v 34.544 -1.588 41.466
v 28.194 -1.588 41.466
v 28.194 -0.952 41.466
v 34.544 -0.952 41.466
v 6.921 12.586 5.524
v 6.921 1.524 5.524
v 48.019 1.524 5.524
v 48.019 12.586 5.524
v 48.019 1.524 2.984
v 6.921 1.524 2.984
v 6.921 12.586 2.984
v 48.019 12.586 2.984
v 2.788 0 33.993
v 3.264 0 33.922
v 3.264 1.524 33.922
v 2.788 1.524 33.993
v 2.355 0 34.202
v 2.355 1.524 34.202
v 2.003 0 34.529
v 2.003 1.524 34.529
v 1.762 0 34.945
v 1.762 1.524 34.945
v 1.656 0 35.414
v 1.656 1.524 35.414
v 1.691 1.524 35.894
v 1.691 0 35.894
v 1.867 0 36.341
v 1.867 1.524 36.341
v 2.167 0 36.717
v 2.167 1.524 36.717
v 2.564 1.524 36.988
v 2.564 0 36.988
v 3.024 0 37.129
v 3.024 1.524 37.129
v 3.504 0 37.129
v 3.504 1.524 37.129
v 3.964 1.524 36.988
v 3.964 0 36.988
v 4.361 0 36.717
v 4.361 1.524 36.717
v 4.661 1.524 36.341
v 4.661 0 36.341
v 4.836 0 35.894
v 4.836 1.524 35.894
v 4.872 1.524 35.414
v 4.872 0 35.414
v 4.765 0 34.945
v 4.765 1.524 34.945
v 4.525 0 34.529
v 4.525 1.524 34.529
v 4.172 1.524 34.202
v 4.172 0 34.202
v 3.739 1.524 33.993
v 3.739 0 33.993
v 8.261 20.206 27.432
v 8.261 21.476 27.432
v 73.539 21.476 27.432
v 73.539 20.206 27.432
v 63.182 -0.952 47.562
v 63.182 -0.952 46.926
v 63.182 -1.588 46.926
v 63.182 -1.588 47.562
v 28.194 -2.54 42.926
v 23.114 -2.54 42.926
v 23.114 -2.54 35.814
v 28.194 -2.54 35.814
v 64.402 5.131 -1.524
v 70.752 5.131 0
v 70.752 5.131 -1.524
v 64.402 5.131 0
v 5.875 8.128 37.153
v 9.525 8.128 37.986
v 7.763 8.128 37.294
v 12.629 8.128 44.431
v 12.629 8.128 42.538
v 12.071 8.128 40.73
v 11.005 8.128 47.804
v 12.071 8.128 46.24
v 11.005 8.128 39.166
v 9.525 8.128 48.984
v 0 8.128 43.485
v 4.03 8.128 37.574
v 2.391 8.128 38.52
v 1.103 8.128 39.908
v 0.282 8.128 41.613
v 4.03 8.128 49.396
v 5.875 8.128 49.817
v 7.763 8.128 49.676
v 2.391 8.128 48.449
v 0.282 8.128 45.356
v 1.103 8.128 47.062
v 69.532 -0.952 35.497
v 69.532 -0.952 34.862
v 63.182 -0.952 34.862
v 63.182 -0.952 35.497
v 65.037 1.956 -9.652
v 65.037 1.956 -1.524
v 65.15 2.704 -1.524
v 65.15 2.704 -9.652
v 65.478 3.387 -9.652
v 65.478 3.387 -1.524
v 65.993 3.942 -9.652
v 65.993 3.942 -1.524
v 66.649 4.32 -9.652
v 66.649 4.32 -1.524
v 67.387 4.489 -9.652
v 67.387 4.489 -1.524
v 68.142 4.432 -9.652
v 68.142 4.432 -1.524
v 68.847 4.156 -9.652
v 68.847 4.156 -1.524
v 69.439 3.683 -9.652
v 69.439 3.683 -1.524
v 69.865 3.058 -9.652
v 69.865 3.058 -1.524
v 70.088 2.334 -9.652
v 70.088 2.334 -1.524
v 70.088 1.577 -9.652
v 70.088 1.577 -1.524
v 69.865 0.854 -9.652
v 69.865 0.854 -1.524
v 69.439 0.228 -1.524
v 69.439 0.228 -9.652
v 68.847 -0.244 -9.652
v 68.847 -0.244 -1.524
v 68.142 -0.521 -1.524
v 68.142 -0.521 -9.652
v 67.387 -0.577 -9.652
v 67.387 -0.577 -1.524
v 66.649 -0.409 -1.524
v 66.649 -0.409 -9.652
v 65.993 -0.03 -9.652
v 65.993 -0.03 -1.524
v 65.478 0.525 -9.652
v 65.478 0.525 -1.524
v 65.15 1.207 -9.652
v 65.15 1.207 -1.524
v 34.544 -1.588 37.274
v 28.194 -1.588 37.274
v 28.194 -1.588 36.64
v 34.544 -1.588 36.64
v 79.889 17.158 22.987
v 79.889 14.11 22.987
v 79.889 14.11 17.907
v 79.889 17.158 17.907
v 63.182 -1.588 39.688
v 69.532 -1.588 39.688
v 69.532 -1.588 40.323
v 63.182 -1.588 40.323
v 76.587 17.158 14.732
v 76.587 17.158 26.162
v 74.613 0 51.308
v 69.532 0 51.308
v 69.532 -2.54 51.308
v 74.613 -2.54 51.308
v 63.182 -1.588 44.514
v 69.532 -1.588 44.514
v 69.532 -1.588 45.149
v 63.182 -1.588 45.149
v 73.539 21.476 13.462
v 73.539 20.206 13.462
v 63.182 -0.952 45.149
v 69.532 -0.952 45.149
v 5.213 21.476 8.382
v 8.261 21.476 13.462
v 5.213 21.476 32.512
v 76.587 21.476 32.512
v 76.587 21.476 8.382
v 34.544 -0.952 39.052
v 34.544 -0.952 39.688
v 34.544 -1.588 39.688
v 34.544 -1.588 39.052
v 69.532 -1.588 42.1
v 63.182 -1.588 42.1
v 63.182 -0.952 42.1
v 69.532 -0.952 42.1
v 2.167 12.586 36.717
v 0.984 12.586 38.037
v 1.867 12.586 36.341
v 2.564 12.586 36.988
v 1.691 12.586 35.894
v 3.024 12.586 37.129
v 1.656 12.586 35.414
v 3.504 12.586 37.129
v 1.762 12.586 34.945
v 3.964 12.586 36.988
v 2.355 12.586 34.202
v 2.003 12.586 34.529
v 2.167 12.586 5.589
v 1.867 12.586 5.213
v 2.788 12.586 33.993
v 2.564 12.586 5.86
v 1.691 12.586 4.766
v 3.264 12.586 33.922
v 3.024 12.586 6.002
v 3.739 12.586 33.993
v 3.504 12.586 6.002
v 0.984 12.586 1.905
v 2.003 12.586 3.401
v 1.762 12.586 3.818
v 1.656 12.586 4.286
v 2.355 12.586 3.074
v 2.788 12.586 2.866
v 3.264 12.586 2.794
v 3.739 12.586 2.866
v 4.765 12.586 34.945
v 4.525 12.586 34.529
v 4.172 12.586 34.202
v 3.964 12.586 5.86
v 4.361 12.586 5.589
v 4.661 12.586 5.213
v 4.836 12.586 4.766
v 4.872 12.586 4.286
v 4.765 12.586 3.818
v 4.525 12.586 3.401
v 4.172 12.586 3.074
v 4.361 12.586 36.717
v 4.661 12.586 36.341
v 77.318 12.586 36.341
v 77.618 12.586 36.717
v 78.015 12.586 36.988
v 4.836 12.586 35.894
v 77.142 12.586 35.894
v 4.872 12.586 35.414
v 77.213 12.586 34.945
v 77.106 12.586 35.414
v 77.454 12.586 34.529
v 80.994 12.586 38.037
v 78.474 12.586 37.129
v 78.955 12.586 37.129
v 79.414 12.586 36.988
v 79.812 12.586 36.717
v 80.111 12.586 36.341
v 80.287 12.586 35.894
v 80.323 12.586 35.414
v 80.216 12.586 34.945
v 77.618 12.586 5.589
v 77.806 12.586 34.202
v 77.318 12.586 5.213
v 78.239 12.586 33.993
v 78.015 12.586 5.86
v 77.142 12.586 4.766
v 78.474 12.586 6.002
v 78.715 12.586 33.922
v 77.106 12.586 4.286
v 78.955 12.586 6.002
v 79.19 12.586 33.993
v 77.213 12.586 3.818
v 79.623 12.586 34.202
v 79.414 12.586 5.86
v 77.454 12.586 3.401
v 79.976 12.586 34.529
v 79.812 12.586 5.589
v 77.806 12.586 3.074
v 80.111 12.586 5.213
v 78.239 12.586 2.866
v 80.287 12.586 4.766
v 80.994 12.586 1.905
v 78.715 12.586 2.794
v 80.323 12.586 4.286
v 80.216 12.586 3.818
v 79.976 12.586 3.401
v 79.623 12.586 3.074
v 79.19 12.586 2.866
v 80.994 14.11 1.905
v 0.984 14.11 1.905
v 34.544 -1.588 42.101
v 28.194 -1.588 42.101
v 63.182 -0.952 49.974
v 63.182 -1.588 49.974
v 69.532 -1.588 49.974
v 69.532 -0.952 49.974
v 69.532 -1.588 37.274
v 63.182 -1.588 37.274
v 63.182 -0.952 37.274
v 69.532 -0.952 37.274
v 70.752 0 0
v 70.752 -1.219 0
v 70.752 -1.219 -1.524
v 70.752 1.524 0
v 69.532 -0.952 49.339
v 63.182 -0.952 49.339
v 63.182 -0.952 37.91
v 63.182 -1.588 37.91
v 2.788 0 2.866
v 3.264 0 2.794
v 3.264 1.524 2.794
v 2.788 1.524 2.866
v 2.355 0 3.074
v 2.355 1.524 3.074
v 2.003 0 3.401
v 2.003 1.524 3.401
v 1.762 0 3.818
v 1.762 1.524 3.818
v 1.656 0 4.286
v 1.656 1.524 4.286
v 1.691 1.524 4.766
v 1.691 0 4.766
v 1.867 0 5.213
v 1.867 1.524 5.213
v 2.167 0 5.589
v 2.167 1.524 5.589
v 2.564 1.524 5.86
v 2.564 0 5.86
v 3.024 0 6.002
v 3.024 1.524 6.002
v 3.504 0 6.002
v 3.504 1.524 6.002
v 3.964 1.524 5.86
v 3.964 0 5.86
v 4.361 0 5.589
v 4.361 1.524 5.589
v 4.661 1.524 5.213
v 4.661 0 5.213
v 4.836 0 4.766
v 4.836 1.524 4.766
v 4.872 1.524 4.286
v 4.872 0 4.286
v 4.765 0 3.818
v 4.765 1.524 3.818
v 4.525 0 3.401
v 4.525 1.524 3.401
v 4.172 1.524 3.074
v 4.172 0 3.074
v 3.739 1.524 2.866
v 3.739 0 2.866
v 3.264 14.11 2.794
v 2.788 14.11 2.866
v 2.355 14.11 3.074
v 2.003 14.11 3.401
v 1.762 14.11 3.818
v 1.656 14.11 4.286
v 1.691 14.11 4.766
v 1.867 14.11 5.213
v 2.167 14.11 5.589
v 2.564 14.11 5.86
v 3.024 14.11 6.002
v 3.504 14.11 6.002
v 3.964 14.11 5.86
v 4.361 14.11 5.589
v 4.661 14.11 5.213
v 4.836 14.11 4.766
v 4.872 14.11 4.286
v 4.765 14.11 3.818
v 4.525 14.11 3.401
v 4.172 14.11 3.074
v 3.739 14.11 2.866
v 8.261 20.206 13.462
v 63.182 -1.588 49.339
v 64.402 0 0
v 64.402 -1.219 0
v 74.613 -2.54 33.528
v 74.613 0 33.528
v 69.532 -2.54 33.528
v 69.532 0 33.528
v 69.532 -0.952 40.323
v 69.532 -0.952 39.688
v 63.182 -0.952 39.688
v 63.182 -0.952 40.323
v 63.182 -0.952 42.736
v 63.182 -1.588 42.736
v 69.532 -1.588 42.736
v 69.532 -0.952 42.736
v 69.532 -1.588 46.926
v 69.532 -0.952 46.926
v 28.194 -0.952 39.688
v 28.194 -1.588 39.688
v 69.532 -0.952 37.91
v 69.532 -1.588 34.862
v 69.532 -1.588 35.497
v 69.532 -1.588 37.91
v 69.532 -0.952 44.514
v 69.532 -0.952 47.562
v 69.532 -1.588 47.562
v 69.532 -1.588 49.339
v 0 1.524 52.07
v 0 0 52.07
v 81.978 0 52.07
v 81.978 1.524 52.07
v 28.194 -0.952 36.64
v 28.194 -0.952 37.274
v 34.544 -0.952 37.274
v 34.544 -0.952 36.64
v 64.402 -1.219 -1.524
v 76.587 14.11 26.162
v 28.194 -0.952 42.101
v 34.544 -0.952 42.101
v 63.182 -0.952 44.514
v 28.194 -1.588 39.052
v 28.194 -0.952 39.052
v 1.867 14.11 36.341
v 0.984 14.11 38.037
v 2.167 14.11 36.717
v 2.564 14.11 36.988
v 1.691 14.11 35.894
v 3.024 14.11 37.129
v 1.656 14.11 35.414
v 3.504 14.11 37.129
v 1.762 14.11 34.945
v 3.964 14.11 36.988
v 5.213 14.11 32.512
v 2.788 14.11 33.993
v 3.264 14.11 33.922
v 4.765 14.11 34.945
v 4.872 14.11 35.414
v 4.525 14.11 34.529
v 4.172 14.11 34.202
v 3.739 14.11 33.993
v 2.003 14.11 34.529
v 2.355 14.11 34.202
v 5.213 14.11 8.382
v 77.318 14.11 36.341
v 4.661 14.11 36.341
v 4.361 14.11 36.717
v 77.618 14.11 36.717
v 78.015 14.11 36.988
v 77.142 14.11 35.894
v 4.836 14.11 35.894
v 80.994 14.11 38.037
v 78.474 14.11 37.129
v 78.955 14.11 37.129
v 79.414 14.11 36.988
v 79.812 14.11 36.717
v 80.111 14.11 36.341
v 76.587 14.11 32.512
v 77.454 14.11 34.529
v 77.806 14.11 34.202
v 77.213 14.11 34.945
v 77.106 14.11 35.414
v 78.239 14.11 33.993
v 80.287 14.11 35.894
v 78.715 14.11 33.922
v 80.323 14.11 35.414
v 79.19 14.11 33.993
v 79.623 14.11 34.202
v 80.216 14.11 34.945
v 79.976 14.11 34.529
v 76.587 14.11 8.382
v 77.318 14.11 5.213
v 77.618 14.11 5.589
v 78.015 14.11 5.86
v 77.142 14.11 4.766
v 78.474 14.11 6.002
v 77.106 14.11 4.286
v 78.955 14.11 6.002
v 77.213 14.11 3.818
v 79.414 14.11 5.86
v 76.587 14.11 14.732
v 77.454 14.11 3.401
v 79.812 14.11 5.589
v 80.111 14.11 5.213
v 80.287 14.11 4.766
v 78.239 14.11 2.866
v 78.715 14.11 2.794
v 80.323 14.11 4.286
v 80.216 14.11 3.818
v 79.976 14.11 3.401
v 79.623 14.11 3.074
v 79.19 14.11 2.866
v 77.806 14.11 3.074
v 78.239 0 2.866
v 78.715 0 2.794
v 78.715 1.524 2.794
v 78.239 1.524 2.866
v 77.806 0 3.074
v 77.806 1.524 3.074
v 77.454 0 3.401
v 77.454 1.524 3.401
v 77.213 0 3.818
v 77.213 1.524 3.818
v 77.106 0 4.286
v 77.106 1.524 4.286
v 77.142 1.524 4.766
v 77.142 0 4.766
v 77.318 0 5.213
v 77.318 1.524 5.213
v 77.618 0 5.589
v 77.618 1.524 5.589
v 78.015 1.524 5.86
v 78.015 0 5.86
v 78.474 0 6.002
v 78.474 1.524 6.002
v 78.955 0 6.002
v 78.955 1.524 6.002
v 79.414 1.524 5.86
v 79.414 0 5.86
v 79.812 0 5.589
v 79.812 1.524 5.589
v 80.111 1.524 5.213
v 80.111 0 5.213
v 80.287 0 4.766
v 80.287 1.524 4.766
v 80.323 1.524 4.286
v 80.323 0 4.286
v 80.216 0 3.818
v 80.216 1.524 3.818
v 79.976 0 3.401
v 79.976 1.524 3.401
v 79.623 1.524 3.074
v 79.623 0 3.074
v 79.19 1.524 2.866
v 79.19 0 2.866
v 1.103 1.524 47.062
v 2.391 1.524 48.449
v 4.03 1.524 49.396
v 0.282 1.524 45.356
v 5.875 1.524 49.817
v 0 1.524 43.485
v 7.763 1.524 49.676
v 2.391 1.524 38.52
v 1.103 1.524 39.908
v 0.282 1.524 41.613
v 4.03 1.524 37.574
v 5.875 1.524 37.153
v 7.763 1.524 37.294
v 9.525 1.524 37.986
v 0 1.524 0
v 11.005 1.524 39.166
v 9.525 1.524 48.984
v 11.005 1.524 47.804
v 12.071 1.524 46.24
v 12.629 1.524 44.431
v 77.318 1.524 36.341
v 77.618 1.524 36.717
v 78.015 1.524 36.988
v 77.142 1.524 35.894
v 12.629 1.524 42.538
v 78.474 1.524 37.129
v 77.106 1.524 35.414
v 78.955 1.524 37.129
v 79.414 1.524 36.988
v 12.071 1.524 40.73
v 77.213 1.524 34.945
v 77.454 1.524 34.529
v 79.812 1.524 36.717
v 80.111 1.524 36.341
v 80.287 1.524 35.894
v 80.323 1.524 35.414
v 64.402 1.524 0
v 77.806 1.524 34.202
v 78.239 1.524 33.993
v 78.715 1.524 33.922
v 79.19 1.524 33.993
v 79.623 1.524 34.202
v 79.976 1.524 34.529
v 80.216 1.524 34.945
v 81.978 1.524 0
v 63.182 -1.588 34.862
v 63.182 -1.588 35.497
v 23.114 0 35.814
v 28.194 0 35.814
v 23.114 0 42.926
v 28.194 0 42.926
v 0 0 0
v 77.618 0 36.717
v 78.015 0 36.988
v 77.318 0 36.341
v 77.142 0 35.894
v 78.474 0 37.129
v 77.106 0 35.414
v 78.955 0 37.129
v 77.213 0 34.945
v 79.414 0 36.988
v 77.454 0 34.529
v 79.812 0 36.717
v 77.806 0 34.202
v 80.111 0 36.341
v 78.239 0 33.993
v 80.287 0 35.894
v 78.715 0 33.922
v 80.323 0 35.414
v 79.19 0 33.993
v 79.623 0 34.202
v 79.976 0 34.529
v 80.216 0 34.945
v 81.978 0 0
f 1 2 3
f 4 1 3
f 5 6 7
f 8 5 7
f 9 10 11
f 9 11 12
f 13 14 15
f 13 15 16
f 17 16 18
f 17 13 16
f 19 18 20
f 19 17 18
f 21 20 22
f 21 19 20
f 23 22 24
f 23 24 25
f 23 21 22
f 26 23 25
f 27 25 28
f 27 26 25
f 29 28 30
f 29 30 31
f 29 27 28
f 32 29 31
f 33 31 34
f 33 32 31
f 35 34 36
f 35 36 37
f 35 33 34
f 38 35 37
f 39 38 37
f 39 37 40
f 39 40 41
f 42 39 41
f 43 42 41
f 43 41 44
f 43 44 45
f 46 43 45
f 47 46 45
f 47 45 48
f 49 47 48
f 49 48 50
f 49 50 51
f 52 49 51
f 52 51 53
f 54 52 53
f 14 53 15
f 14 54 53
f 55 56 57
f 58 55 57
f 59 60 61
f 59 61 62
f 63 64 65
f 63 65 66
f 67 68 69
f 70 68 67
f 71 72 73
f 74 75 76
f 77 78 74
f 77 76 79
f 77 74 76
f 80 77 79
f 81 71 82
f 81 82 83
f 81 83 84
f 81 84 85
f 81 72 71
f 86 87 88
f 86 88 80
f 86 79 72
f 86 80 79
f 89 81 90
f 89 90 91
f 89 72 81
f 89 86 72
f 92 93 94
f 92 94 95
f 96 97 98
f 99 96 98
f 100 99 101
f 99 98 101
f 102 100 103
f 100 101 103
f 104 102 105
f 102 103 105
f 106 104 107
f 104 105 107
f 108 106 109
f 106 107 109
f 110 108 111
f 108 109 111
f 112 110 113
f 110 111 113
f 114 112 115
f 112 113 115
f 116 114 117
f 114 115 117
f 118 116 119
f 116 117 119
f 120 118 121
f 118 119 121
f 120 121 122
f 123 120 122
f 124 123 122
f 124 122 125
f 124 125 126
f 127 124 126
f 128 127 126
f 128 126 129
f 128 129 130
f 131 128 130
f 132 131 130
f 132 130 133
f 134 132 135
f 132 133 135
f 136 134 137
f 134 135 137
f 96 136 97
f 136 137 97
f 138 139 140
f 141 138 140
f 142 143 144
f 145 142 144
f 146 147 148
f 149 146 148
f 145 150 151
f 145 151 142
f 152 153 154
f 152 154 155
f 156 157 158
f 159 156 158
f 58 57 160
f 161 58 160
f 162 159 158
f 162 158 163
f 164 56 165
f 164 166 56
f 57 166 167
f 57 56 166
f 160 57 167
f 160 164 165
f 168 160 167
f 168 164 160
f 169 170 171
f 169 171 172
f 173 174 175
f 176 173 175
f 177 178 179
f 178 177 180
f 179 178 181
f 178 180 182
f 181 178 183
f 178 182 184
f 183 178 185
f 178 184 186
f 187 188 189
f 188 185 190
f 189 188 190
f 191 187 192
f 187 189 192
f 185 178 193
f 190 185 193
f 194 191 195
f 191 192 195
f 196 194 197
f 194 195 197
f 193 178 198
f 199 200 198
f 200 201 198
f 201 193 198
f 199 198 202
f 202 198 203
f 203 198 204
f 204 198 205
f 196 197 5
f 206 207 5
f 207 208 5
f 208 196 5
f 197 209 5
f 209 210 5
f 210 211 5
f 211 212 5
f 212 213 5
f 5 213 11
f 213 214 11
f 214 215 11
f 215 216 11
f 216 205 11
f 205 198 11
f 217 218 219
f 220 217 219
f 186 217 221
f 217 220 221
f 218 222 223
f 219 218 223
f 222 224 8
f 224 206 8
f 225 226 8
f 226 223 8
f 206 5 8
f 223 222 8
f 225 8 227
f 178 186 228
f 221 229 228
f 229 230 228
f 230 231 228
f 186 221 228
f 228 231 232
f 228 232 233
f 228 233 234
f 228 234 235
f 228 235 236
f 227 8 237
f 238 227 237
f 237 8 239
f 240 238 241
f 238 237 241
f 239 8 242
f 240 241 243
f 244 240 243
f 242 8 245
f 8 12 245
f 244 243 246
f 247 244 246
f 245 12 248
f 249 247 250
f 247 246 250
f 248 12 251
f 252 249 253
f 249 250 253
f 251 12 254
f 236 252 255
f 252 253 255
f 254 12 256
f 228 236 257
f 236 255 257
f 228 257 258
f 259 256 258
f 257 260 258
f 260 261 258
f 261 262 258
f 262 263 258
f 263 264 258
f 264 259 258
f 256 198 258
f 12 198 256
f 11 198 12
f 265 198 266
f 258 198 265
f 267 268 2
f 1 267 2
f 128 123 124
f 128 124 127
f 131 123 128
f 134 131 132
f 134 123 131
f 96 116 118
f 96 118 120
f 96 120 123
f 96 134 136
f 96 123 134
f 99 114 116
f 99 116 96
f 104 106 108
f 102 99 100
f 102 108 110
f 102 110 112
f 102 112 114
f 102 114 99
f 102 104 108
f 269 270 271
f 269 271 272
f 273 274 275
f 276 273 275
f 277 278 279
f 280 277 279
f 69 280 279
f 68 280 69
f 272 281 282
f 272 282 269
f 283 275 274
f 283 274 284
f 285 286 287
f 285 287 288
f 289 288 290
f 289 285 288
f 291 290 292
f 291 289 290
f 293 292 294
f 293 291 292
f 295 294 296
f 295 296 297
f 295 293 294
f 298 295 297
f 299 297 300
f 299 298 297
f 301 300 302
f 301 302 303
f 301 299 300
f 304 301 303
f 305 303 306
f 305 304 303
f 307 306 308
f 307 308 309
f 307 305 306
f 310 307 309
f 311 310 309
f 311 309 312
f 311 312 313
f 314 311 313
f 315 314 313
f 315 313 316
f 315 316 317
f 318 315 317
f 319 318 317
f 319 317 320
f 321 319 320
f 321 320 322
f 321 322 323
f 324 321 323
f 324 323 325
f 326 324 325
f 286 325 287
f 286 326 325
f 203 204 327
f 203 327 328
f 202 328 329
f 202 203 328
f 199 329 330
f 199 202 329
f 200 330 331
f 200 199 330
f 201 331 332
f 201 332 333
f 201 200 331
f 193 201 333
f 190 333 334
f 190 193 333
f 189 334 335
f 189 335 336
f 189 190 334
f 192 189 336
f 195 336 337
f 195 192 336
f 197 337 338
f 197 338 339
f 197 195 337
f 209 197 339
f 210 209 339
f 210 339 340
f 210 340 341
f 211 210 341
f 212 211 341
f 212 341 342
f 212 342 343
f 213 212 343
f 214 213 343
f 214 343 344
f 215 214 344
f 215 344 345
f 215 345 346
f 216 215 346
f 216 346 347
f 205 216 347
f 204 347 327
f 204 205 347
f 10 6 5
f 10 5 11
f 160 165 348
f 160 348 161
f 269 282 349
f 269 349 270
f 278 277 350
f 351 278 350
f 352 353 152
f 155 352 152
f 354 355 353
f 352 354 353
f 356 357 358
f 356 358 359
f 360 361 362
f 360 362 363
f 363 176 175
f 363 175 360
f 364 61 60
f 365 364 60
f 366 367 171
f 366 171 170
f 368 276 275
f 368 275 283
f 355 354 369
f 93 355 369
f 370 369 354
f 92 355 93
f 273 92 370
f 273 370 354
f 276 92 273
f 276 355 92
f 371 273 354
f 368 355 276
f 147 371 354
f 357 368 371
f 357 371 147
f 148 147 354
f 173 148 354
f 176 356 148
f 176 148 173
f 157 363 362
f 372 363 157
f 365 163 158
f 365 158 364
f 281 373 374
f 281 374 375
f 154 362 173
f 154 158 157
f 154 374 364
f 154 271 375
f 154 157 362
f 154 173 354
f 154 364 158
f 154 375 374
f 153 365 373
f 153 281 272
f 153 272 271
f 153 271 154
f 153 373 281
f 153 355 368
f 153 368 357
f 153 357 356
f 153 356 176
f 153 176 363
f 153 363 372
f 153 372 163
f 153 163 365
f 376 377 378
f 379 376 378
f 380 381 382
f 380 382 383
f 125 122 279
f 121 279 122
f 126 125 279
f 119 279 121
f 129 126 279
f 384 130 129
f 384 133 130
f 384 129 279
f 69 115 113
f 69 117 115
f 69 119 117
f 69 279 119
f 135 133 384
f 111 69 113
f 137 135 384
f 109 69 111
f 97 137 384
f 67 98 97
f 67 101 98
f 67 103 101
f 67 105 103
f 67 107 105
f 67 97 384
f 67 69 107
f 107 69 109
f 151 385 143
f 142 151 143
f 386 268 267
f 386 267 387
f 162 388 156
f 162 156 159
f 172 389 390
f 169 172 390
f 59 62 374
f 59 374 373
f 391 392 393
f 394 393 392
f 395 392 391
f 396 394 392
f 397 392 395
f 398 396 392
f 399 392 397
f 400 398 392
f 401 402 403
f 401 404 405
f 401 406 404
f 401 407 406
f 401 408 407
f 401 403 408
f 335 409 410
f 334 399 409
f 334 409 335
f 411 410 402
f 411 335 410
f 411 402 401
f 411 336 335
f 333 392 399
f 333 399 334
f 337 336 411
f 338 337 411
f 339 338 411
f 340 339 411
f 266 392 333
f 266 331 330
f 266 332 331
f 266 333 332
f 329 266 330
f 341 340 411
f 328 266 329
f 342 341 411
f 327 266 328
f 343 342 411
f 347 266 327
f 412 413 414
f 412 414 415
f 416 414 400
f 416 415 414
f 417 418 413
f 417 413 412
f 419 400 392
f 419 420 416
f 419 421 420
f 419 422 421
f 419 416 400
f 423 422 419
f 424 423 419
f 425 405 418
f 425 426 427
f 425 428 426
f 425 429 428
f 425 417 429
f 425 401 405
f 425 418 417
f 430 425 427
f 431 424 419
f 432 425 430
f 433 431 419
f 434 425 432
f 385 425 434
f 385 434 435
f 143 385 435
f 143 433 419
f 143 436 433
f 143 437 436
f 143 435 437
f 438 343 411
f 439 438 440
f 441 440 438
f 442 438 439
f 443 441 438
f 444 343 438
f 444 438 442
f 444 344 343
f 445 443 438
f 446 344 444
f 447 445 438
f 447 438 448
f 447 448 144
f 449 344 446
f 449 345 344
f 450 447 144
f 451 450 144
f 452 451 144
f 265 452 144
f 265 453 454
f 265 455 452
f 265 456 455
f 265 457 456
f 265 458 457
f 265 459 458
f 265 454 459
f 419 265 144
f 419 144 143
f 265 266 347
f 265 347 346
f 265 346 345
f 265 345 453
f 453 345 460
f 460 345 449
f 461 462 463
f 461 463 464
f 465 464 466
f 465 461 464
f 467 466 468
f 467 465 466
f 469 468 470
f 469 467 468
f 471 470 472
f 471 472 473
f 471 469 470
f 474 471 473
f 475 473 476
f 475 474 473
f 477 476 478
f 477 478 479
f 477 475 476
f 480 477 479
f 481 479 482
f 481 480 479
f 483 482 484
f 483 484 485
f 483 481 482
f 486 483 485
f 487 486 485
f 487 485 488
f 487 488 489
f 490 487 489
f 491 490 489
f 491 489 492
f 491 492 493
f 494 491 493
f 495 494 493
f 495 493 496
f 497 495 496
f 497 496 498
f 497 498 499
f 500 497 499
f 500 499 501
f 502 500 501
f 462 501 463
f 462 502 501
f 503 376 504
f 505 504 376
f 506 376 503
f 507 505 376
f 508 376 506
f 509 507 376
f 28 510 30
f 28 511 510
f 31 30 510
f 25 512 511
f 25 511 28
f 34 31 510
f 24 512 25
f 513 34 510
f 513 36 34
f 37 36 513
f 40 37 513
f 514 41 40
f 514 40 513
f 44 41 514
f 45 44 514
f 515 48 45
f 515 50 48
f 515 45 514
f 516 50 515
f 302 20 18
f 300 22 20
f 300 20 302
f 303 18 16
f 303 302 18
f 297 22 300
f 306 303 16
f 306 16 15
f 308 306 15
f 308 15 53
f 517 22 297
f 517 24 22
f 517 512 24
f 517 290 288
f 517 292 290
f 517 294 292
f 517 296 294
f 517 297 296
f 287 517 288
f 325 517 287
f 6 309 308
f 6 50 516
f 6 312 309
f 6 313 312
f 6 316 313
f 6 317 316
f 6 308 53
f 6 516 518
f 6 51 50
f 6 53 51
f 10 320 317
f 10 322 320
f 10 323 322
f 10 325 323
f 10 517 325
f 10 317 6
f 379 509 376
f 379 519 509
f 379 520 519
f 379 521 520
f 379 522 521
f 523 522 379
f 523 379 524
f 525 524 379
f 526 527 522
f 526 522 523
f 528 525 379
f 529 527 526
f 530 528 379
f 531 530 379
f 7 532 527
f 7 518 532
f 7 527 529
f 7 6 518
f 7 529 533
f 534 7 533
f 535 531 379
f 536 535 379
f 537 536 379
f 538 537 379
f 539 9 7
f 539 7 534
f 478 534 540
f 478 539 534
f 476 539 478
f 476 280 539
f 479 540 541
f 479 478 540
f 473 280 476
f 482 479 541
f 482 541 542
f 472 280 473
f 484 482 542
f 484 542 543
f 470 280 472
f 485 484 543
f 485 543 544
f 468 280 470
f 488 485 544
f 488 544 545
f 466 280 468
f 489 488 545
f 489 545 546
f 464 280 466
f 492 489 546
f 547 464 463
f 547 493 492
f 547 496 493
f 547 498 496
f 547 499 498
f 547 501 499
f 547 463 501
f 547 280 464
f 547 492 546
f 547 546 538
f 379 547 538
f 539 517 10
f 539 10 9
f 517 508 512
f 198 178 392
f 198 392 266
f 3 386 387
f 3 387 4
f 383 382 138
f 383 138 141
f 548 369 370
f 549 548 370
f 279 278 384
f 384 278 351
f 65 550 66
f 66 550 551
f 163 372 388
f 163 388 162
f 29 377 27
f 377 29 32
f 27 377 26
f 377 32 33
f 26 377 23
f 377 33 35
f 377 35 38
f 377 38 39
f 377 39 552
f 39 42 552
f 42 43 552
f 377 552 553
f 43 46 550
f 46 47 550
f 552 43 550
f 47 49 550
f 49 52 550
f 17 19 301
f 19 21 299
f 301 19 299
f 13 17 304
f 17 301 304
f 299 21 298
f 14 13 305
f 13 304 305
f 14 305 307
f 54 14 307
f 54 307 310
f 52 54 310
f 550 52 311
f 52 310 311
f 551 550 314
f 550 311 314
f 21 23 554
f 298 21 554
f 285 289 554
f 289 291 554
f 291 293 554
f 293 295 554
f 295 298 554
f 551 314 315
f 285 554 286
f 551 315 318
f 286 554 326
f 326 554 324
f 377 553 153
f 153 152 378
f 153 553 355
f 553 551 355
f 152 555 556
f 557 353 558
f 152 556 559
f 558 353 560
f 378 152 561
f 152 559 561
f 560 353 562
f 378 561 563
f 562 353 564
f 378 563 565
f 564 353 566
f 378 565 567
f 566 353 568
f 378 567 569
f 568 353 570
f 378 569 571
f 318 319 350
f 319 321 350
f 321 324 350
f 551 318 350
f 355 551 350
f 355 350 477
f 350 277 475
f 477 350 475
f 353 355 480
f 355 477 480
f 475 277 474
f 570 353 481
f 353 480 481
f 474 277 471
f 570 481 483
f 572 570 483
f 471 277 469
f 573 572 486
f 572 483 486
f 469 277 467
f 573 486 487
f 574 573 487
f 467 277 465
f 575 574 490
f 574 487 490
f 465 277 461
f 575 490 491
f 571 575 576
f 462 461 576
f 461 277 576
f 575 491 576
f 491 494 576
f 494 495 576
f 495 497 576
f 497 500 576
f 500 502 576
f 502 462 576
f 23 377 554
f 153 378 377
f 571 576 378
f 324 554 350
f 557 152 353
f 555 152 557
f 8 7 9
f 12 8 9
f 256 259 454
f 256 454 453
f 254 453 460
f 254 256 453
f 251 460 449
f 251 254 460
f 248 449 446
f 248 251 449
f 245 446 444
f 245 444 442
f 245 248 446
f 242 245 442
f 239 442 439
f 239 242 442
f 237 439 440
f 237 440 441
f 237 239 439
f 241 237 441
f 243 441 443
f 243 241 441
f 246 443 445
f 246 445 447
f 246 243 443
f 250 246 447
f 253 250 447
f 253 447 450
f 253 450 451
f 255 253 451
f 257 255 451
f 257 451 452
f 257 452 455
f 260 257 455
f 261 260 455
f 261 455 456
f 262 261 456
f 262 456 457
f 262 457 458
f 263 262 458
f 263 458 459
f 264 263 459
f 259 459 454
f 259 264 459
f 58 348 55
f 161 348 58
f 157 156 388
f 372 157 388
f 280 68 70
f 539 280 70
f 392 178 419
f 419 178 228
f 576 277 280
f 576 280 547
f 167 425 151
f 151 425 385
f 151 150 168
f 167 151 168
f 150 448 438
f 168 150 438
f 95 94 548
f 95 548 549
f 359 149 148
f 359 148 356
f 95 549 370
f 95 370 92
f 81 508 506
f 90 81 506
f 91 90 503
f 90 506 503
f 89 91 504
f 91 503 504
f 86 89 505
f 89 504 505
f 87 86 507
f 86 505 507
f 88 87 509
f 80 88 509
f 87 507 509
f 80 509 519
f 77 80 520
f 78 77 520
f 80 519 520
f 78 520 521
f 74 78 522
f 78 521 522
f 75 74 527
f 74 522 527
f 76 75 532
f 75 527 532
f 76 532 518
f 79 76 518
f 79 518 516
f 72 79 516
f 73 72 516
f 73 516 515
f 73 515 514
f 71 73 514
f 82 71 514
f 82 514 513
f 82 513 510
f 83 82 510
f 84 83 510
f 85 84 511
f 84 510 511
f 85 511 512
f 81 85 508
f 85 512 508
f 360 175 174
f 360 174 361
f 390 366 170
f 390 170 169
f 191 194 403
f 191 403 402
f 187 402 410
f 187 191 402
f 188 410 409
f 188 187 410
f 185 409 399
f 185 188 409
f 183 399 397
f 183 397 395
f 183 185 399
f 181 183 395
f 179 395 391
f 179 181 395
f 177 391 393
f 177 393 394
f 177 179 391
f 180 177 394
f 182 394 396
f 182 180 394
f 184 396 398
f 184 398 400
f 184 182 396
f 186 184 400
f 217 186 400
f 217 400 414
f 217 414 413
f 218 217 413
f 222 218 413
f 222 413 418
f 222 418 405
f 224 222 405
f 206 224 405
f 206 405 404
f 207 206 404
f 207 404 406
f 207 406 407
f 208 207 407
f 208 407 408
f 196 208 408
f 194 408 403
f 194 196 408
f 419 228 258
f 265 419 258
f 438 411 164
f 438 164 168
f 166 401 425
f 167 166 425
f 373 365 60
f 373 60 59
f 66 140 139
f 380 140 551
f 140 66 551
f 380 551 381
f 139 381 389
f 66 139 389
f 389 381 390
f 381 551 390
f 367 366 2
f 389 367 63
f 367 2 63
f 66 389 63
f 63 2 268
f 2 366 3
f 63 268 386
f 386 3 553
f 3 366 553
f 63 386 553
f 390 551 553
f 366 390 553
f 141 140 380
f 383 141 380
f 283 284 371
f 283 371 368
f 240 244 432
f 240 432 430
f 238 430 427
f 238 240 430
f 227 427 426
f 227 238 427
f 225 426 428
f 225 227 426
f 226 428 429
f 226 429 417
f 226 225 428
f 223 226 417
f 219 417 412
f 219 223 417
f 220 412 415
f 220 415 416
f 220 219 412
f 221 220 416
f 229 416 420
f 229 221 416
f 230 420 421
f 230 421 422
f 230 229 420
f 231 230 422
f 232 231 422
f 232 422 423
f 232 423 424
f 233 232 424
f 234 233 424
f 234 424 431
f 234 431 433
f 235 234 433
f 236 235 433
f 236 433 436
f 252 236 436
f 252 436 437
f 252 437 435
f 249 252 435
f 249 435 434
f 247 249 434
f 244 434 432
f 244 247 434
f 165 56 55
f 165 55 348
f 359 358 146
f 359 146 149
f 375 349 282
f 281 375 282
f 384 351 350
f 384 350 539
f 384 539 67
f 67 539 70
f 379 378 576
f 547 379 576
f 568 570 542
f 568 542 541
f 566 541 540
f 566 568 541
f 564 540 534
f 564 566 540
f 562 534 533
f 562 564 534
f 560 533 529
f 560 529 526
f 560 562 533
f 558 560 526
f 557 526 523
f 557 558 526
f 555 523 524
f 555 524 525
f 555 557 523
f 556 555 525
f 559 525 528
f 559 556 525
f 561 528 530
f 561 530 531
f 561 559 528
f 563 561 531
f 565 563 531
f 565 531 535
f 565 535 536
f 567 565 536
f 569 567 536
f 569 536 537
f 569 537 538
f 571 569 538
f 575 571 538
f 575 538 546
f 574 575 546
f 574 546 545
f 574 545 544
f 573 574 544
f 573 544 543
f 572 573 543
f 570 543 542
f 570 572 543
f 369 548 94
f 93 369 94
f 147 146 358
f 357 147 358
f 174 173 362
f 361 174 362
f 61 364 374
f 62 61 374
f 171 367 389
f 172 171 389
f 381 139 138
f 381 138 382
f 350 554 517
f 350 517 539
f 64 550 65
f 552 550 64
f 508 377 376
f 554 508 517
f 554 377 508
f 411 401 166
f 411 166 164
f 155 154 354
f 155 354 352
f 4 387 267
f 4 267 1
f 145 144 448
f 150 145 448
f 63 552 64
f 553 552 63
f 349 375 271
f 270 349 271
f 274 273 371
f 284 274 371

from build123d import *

# Parameters (mm, degrees)
SKETCH1_W            = 81.9785
SKETCH1_H            = 52.07
SKETCH1_R            = 1.6129
BASE_PCB_DEPTH       = 1.524
SKETCH2_W            = 6.35
SKETCH2_H            = 6.35
BOSS_EXTRUDE2_DEPTH  = 1.524
SKETCH3_R            = 2.54
BOSS_EXTRUDE3_DEPTH  = 8.128
SKETCH4_W            = 41.0972
SKETCH4_H            = 2.54
LCD_HEADER_DEPTH     = 11.0617
SKETCH5_W            = 80.01
SKETCH5_H            = 36.1315
SKETCH5_R            = 1.6129
LCD_PCB_DEPTH        = 1.524
SKETCH6_W            = 71.374
SKETCH6_H            = 24.13
BOSS_EXTRUDE6_DEPTH  = 7.366
SKETCH7_W            = 65.278
SKETCH7_H            = 13.97
CUT_EXTRUDE1_DEPTH   = 1.27
BOSS_EXTRUDE7_DEPTH  = 3.048
SKETCH9_R            = 6.35
BUZZER_DEPTH         = 6.604
SKETCH10_W           = 5.08
SKETCH10_H           = 17.78
BOSS_EXTRUDE9_DEPTH  = 2.54
SKETCH11_W           = 0.635
SKETCH11_H           = 0.635
BOSS_EXTRUDE10_DEPTH = 6.35
SKETCH12_W           = 5.08
SKETCH12_H           = 7.112
BOSS_EXTRUDE11_DEPTH = 2.54
SKETCH13_W           = 0.635
SKETCH13_H           = 0.635
BOSS_EXTRUDE12_DEPTH = 6.35


with BuildPart() as part:
    # Sketch1 → Base PCB (new body)
    with BuildSketch(Plane(origin=(0, 0, 0), x_dir=(1, 0, 0), z_dir=(0, 1, 0))):
        with Locations((40.98925, -26.035)):
            Rectangle(SKETCH1_W, SKETCH1_H)
        with Locations(Location((3.2639, -4.4069, 0), (0, 0, 90))):
            Circle(SKETCH1_R, mode=Mode.SUBTRACT)
        with Locations(Location((3.2639, -35.5346, 0), (0, 0, 90))):
            Circle(SKETCH1_R, mode=Mode.SUBTRACT)
        with Locations(Location((78.7146, -35.5346, 0), (0, 0, 90))):
            Circle(SKETCH1_R, mode=Mode.SUBTRACT)
        with Locations(Location((78.7146, -4.4069, 0), (0, 0, 90))):
            Circle(SKETCH1_R, mode=Mode.SUBTRACT)
    extrude(amount=BASE_PCB_DEPTH)

    # Sketch2 → Boss-Extrude2 (add)
    with BuildSketch(Plane(origin=(0, 0, 0), x_dir=(-1, 0, 0), z_dir=(0, 0, -1))):
        with Locations((-67.5767, 1.9558)):
            Rectangle(SKETCH2_W, SKETCH2_H)
    extrude(amount=BOSS_EXTRUDE2_DEPTH)

    # Sketch3 → Boss-Extrude3 (add)
    with BuildSketch(Plane(origin=(0, 0, -1.524), x_dir=(-1, 0, 0), z_dir=(0, 0, -1))):
        with Locations((-67.5767, 1.9558)):
            Circle(SKETCH3_R)
    extrude(amount=BOSS_EXTRUDE3_DEPTH)

    # Sketch4 → LCD Header (add)
    with BuildSketch(Plane(origin=(0, 1.524, 0), x_dir=(1, 0, 0), z_dir=(0, 1, 0))):
        with Locations((27.4701, -4.2545)):
            Rectangle(SKETCH4_W, SKETCH4_H)
    extrude(amount=LCD_HEADER_DEPTH)

    # Sketch5 → LCD PCB (add)
    with BuildSketch(Plane(origin=(0, 12.5857, 0), x_dir=(1, 0, 0), z_dir=(0, 1, 0))):
        with Locations((40.98925, -19.97075)):
            Rectangle(SKETCH5_W, SKETCH5_H)
        with Locations(Location((78.7146, -4.4069, 0), (0, 0, 90))):
            Circle(SKETCH5_R, mode=Mode.SUBTRACT)
        with Locations(Location((78.7146, -35.5346, 0), (0, 0, 90))):
            Circle(SKETCH5_R, mode=Mode.SUBTRACT)
        with Locations(Location((3.2639, -35.5346, 0), (0, 0, 90))):
            Circle(SKETCH5_R, mode=Mode.SUBTRACT)
        with Locations(Location((3.2639, -4.4069, 0), (0, 0, 90))):
            Circle(SKETCH5_R, mode=Mode.SUBTRACT)
    extrude(amount=LCD_PCB_DEPTH)

    # Sketch6 → Boss-Extrude6 (add)
    with BuildSketch(Plane(origin=(0, 14.1097, 0), x_dir=(1, 0, 0), z_dir=(0, 1, 0))):
        with Locations((40.90035, -20.447)):
            Rectangle(SKETCH6_W, SKETCH6_H)
    extrude(amount=BOSS_EXTRUDE6_DEPTH)

    # Sketch7 → Cut-Extrude1 (cut)
    with BuildSketch(Plane(origin=(0, 21.4757, 0), x_dir=(1, 0, 0), z_dir=(0, 1, 0))):
        with Locations((40.90035, -20.447)):
            Rectangle(SKETCH7_W, SKETCH7_H)
    extrude(amount=-CUT_EXTRUDE1_DEPTH, mode=Mode.SUBTRACT)

    # Sketch8 → Boss-Extrude7 (add)
    with BuildSketch(Plane(origin=(0, 14.1097, 0), x_dir=(1, 0, 0), z_dir=(0, 1, 0))):
        Polygon((76.58735, -14.732), (76.58735, -26.162), (79.88935, -22.987), (79.88935, -17.907), align=None)
    extrude(amount=BOSS_EXTRUDE7_DEPTH)

    # Sketch9 → Buzzer (add)
    with BuildSketch(Plane(origin=(0, 1.524, 0), x_dir=(1, 0, 0), z_dir=(0, 1, 0))):
        with Locations(Location((6.35, -43.4848, 0), (0, 0, 180))):
            Circle(SKETCH9_R)
    extrude(amount=BUZZER_DEPTH)

    # Sketch10 → Boss-Extrude9 (add)
    with BuildSketch(Plane.XZ):
        with Locations((72.0725, 42.418)):
            Rectangle(SKETCH10_W, SKETCH10_H)
    extrude(amount=BOSS_EXTRUDE9_DEPTH)

    # Sketch11 → Boss-Extrude10 (add)
    with BuildSketch(Plane.ZY.offset(-69.5325)):
        with Locations((37.592, -1.27)):
            Rectangle(SKETCH11_W, SKETCH11_H)
        with Locations((35.179, -1.27)):
            Rectangle(SKETCH11_W, SKETCH11_H)
        with Locations((40.005, -1.27)):
            Rectangle(SKETCH11_W, SKETCH11_H)
        with Locations((42.418, -1.27)):
            Rectangle(SKETCH11_W, SKETCH11_H)
        with Locations((44.831, -1.27)):
            Rectangle(SKETCH11_W, SKETCH11_H)
        with Locations((47.244, -1.27)):
            Rectangle(SKETCH11_W, SKETCH11_H)
        with Locations((49.657, -1.27)):
            Rectangle(SKETCH11_W, SKETCH11_H)
    extrude(amount=BOSS_EXTRUDE10_DEPTH)

    # Sketch12 → Boss-Extrude11 (add)
    with BuildSketch(Plane.XZ):
        with Locations((25.654, 39.37)):
            Rectangle(SKETCH12_W, SKETCH12_H)
    extrude(amount=BOSS_EXTRUDE11_DEPTH)

    # Sketch13 → Boss-Extrude12 (add)
    with BuildSketch(Plane(origin=(28.194, 0, 0), x_dir=(0, 0, -1), z_dir=(1, 0, 0))):
        with Locations((-39.37, -1.27)):
            Rectangle(SKETCH13_W, SKETCH13_H)
        with Locations((-41.783, -1.27)):
            Rectangle(SKETCH13_W, SKETCH13_H)
        with Locations((-36.957, -1.27)):
            Rectangle(SKETCH13_W, SKETCH13_H)
    extrude(amount=BOSS_EXTRUDE12_DEPTH)


solid = part.part
